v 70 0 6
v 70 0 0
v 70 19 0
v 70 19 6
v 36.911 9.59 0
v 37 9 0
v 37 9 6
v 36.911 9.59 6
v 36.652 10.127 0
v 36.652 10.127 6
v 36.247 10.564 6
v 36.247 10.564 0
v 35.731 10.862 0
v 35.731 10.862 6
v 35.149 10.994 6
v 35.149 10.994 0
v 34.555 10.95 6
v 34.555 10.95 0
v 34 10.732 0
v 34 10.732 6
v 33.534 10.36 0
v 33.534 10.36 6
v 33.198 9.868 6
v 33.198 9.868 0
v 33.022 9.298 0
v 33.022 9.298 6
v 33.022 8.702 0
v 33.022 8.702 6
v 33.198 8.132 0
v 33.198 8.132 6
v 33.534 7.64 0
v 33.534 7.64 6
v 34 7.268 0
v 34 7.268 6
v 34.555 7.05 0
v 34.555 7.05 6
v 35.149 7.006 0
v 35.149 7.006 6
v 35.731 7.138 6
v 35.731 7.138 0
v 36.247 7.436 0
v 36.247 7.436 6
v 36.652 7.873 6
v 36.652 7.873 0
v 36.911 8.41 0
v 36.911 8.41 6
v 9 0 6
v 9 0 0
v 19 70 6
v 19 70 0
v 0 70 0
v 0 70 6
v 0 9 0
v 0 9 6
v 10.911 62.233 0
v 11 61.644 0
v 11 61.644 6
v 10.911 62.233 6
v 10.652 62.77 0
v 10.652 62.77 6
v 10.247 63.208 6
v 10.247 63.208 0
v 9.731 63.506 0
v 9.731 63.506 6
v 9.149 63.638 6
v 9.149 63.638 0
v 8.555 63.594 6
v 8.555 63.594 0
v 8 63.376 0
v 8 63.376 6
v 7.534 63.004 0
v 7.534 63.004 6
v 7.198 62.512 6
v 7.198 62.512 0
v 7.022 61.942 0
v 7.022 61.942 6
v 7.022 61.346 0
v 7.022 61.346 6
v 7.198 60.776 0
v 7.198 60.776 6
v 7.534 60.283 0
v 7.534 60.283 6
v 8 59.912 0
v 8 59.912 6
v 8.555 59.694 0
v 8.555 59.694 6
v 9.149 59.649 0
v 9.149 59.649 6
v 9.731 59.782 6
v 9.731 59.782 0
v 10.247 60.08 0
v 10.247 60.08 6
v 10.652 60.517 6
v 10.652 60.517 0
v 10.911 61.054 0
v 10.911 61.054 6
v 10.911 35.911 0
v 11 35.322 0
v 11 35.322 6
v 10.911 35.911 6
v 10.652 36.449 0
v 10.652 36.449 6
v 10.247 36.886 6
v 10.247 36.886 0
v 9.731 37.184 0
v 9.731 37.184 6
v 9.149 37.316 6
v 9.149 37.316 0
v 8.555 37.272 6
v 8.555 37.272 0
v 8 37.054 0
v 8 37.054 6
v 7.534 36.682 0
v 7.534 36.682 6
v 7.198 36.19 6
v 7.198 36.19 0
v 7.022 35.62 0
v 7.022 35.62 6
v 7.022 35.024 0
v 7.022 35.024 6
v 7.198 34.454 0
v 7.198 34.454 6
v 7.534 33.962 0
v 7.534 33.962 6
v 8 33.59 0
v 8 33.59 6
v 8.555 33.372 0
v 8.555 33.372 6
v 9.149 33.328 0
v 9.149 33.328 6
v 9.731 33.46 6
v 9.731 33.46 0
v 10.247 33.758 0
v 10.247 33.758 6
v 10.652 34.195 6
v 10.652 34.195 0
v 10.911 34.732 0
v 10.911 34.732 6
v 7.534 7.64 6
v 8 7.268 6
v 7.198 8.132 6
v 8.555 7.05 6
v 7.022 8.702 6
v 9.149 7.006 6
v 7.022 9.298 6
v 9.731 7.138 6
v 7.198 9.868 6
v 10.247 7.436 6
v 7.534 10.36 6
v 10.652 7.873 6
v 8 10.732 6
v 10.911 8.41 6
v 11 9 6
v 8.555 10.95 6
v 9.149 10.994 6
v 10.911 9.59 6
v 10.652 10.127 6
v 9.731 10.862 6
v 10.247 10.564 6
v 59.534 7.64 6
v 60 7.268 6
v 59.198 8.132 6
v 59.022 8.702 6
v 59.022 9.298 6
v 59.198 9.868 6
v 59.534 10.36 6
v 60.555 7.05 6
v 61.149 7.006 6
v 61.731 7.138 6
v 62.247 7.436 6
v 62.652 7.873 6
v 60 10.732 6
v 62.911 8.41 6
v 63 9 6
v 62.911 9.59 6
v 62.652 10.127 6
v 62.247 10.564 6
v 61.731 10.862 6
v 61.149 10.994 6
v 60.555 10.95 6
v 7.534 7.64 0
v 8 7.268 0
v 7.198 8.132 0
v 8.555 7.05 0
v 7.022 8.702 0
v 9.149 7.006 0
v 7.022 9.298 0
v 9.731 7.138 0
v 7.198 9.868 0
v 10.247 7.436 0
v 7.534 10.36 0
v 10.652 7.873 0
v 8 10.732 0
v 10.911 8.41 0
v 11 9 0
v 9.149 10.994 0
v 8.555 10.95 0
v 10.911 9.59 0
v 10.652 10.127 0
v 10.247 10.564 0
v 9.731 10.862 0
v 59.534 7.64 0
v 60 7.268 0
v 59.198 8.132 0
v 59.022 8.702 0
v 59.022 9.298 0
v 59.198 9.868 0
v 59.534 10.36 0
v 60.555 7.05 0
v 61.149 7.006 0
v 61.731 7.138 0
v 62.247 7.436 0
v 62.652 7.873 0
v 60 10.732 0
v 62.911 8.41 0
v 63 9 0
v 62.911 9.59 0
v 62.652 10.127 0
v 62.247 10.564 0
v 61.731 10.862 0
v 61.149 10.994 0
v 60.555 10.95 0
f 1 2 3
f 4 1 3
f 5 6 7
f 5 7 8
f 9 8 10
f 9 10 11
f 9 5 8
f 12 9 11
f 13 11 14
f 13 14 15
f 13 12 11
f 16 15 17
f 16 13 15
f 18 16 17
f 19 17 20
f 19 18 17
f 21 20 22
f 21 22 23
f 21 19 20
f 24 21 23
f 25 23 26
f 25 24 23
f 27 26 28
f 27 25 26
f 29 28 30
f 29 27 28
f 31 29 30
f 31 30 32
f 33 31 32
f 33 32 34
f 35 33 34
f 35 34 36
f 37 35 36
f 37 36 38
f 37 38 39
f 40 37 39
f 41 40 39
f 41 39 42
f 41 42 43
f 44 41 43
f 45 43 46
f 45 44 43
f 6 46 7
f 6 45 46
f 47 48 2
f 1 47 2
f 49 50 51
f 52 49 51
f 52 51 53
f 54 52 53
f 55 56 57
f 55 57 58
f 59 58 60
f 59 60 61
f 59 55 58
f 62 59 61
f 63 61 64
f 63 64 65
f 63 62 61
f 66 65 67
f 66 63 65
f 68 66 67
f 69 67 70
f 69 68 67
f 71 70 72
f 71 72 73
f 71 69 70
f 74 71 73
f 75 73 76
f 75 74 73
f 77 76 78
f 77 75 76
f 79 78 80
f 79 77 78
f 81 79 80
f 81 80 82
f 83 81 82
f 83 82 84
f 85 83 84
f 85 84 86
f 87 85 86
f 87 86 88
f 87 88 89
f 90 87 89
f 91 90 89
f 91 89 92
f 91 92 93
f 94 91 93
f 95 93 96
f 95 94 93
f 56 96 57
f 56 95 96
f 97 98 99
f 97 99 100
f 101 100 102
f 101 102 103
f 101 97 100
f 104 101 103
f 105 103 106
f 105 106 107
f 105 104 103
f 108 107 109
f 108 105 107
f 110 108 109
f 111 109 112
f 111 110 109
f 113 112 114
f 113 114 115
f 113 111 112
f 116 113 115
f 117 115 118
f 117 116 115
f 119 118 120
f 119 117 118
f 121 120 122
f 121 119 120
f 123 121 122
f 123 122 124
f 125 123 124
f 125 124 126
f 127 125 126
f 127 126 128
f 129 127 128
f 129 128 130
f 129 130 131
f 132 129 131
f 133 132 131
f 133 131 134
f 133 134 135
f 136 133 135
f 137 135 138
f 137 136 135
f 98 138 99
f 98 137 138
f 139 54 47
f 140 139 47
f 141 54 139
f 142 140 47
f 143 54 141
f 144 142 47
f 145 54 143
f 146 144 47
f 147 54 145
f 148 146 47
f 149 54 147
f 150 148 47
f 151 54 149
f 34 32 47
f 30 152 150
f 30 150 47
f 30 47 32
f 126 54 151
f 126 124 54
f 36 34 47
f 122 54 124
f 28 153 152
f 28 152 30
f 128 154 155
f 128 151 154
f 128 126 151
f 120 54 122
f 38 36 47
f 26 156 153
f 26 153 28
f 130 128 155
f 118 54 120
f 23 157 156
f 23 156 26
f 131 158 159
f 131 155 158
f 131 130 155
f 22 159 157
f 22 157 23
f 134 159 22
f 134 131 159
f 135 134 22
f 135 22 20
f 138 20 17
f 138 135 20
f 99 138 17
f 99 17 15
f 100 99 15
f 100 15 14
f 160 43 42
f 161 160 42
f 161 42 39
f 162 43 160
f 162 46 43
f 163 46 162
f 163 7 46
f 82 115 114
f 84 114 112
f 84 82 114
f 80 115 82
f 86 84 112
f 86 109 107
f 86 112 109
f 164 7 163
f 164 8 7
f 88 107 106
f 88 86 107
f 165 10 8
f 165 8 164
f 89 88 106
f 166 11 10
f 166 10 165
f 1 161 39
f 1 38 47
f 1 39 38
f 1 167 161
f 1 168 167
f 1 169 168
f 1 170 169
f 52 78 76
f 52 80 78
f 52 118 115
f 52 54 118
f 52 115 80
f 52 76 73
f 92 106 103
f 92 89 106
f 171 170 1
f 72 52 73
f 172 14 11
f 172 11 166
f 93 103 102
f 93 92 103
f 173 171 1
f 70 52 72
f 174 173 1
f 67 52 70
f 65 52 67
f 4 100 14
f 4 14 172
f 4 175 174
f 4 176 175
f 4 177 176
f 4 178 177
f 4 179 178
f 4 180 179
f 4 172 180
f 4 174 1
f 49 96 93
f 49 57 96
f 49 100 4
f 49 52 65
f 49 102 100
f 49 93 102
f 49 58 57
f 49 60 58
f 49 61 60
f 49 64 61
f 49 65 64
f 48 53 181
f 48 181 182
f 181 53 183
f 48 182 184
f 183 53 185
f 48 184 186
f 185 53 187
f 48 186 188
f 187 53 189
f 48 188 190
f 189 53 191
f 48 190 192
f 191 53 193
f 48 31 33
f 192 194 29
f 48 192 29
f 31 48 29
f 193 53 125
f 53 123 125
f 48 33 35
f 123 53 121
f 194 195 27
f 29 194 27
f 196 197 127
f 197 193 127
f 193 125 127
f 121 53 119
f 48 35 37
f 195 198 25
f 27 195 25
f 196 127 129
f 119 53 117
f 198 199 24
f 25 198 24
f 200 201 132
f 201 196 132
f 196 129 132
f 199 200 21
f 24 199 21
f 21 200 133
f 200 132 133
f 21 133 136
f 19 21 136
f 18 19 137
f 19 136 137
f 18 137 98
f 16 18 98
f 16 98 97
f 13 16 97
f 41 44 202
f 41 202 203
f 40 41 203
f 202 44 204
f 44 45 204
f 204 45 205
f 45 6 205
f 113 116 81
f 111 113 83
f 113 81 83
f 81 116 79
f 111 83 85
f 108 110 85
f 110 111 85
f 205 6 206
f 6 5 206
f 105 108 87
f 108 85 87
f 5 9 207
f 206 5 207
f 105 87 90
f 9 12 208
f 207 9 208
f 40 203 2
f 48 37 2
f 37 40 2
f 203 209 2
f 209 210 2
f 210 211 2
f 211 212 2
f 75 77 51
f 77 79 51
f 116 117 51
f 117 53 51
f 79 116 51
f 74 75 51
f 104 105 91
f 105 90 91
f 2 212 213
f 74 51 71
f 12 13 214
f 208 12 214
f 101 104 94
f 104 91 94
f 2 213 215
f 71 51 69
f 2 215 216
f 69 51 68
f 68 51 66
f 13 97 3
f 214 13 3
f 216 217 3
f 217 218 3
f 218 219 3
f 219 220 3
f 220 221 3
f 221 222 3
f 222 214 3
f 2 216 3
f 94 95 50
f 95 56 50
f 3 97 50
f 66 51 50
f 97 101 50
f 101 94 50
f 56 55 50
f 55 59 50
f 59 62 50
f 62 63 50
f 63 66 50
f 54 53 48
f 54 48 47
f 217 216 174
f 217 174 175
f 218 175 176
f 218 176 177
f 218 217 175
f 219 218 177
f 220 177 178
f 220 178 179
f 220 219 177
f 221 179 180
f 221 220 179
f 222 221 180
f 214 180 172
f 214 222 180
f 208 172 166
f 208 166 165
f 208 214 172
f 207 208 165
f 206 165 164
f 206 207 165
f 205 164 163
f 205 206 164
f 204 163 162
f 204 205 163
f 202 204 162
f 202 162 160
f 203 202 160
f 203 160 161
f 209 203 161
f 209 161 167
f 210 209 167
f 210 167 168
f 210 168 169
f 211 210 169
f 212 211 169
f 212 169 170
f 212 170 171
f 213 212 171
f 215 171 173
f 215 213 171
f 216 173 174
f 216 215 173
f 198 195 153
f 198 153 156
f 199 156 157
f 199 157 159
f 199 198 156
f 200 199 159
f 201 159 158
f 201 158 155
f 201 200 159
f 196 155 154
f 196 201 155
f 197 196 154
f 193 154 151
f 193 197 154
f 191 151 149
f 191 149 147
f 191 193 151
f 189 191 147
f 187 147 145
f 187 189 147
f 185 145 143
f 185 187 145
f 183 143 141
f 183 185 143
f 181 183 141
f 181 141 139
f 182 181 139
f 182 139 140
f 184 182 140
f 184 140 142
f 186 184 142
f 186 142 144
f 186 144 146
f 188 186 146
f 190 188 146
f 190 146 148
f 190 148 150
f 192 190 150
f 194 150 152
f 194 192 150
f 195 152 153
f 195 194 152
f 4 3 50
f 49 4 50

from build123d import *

# Parameters (mm, degrees)
SKETCH1_R           = 2
BOSS_EXTRUDE1_DEPTH = 6
CHAMFER1_SIZE       = 9


with BuildPart() as part:
    # Sketch1 → Boss-Extrude1 (new body)
    with BuildSketch(Plane.XY):
        Polygon((0, 70), (0, 0), (70, 0), (70, 19), (19, 70), align=None)
        with Locations((9, 9)):
            Circle(SKETCH1_R, mode=Mode.SUBTRACT)
        with Locations((35, 9)):
            Circle(SKETCH1_R, mode=Mode.SUBTRACT)
        with Locations((61, 9)):
            Circle(SKETCH1_R, mode=Mode.SUBTRACT)
        with Locations((9, 61.643837586)):
            Circle(SKETCH1_R, mode=Mode.SUBTRACT)
        with Locations((9, 35.321918793)):
            Circle(SKETCH1_R, mode=Mode.SUBTRACT)
    extrude(amount=BOSS_EXTRUDE1_DEPTH)

    # Chamfer1
    chamfer1_edges = [part.edges().sort_by_distance(p)[0] for p in [
        (0, 0, 3),
    ]]
    chamfer(chamfer1_edges, length=CHAMFER1_SIZE)


solid = part.part
